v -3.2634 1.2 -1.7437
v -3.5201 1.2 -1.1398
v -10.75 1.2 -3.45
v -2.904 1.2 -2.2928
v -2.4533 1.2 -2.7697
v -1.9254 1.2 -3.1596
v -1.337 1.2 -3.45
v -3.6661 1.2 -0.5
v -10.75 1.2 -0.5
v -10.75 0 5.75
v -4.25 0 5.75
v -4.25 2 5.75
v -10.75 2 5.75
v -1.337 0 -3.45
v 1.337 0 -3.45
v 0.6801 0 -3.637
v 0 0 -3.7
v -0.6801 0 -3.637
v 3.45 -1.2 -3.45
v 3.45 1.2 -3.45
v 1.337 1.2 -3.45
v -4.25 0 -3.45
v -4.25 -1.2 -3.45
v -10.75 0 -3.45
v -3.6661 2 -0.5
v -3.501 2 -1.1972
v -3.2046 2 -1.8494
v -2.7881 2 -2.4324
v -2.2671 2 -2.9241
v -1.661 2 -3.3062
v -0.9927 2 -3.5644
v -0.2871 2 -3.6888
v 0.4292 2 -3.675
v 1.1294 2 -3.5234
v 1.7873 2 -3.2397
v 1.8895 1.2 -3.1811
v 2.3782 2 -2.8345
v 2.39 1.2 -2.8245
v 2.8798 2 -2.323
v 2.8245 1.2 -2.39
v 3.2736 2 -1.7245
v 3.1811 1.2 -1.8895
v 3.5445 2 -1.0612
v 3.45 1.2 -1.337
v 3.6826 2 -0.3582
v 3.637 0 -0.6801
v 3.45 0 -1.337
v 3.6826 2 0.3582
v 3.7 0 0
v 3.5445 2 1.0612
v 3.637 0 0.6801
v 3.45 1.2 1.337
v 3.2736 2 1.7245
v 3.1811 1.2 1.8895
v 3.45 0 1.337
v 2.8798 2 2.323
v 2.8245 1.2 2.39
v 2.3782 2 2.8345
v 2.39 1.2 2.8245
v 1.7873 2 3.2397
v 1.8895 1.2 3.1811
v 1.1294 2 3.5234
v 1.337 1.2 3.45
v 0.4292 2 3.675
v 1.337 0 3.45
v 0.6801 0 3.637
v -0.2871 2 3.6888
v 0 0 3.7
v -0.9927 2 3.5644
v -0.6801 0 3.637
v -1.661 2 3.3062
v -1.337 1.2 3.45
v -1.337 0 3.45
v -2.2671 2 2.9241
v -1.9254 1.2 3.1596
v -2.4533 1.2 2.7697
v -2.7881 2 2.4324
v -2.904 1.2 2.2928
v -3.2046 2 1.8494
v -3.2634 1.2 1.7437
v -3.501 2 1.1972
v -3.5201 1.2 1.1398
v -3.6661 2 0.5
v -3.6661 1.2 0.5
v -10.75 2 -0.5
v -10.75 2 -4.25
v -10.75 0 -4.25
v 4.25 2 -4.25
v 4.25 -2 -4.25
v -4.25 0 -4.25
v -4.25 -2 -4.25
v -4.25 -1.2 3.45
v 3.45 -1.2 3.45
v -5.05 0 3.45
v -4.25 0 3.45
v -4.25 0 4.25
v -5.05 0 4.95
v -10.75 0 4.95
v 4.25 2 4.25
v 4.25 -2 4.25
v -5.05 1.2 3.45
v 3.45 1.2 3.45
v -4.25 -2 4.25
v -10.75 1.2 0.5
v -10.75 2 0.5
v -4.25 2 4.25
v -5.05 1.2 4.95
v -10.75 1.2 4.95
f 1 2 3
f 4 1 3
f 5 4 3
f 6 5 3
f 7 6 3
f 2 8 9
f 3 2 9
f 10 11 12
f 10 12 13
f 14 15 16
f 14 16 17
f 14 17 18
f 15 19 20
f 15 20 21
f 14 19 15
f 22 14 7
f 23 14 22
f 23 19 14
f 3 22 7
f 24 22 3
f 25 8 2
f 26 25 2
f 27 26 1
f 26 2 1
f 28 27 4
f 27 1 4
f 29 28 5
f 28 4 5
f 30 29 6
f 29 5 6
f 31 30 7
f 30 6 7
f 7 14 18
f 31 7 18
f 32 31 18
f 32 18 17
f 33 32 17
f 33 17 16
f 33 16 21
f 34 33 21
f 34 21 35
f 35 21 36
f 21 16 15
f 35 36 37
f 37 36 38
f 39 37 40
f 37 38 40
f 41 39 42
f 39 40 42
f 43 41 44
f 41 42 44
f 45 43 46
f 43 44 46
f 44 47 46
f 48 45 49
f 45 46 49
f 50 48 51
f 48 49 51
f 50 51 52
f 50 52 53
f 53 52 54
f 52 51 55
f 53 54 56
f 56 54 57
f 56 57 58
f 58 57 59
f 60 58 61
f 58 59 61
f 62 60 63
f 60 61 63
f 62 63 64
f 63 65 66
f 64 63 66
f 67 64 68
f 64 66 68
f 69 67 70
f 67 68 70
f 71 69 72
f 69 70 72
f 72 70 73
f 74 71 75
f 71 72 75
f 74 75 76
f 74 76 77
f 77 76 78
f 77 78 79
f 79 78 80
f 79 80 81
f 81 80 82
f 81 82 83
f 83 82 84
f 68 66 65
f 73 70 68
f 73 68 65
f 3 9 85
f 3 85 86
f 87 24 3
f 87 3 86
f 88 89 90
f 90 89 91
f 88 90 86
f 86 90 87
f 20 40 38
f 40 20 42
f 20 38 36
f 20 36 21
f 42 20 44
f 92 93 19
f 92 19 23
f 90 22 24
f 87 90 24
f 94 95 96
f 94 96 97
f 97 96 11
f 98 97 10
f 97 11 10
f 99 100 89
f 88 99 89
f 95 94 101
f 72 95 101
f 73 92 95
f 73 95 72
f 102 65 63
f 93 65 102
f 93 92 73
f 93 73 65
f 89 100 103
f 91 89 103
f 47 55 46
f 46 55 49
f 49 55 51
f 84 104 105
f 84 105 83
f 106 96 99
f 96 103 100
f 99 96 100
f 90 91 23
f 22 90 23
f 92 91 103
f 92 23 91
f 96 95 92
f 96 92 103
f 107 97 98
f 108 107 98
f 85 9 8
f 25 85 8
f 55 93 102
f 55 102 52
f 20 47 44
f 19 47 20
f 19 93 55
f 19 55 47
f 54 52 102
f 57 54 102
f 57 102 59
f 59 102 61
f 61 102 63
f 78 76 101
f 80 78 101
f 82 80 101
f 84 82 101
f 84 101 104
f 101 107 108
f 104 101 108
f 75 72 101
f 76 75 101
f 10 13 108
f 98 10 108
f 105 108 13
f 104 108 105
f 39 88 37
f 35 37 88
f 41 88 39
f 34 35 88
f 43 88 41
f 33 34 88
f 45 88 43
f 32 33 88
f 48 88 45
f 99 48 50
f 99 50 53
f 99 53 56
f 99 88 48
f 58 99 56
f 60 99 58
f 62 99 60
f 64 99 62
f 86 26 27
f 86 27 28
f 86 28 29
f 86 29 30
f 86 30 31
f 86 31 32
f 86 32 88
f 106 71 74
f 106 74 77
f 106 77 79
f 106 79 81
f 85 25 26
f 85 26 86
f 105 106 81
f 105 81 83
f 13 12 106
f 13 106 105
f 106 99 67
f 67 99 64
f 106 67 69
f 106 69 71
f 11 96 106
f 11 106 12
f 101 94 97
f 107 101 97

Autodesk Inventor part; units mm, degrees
ref_plane "YZ Plane" through (0, 0, 0) normal (1, 0, 0) x (0, 1, 0)
ref_plane "XZ Plane" through (0, 0, 0) normal (0, 1, 0) x (-1, 0, 0)
ref_plane "XY Plane" through (0, 0, 0) normal (0, 0, 1) x (1, 0, 0)
sketch "Sketch1" plane through (0, 0, 0) normal (0, 1, 0) x (-1, 0, 0)
  line L0 (-4.25, -4.25) -> (4.25, -4.25)
  line L1 (4.25, -4.25) -> (4.25, 4.25)
  line L2 (4.25, 4.25) -> (-4.25, 4.25)
  line L3 (-4.25, 4.25) -> (-4.25, -4.25)
  line L4 (-4.25, -4.25) -> (4.25, 4.25) construction
  line L5 (4.25, -4.25) -> (-4.25, 4.25) construction
  circle A0 centre (0, 0) radius 3.7
  line L6 (10.75, 0.5) -> (3.6661, 0.5)
  line L7 (10.75, -0.5) -> (3.6661, -0.5)
  line L8 (6.6744, 0) -> (-5, 0)
  line L9 (4.25, 4.25) -> (4.25, 5.75)
  line L10 (4.25, 5.75) -> (10.75, 5.75)
  line L11 (10.75, 5.75) -> (10.75, -4.25)
  line L12 (10.75, -4.25) -> (4.25, -4.25)
  point P0 (4.25, 0.5)
  point P1 (4.25, -0.5)
  dimension "d0" = 8.5
  dimension "d1" = 8.5
  dimension "d2" = 7.4
  dimension "d6" = 1
  dimension "d9" = 1.5
  dimension "d10" = 6.5
extrude "Extrusion1" add sketch "Sketch1" along normal mid plane 4
shell "Shell2" thickness 0.8 removed faces 1 at (-10.75, 0.6667, 2.4167)
extrude "Extrusion2" cut sketch "Sketch1" along normal up to next contours L7 A0 L8 L1 | L1 L6 L11 L7 | L8 A0 | A0 L8 | L8 A0 L6 L1
extrude "Extrusion3" cut sketch "Sketch1" against normal up to next contours L1 L7 L11 L12 | L1 L6 L11 L7 | L9 L10 L11 L6 L1
properties part number "camera"
